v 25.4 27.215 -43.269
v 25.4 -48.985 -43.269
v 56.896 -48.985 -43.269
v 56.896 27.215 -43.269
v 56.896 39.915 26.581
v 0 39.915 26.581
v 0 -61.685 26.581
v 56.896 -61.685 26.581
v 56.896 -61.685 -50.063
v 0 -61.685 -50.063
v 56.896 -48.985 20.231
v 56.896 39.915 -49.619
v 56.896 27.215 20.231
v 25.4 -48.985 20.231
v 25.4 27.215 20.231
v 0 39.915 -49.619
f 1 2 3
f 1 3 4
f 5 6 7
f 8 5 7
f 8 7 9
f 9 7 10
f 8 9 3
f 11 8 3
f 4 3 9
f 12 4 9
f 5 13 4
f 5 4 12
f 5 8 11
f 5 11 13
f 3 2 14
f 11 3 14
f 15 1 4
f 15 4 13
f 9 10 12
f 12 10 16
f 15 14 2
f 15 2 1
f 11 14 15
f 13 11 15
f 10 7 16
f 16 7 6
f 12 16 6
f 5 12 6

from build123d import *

# Parameters (mm, degrees)
F0_W     = 76.2
F0_H     = 63.5
F1_DEPTH = 56.896
F2_DEPTH = 25.4


with BuildPart() as f1:
    # F0 (on Right) → F1 (new body)
    with BuildSketch(Plane.YZ):
        Polygon((-61.684637, -50.062766), (39.915363, -49.619449), (39.915363, 26.580551), (-61.684637, 26.580551), align=None)
        with Locations((-10.884637, -11.519449)):
            Rectangle(F0_W, F0_H, mode=Mode.SUBTRACT)
    extrude(amount=F1_DEPTH)

    # F0 (on Right) → F2 (join)
    with BuildSketch(Plane.YZ):
        with Locations((-10.884637, -11.519449)):
            Rectangle(F0_W, F0_H)
    extrude(amount=F2_DEPTH)


solid = f1.part
